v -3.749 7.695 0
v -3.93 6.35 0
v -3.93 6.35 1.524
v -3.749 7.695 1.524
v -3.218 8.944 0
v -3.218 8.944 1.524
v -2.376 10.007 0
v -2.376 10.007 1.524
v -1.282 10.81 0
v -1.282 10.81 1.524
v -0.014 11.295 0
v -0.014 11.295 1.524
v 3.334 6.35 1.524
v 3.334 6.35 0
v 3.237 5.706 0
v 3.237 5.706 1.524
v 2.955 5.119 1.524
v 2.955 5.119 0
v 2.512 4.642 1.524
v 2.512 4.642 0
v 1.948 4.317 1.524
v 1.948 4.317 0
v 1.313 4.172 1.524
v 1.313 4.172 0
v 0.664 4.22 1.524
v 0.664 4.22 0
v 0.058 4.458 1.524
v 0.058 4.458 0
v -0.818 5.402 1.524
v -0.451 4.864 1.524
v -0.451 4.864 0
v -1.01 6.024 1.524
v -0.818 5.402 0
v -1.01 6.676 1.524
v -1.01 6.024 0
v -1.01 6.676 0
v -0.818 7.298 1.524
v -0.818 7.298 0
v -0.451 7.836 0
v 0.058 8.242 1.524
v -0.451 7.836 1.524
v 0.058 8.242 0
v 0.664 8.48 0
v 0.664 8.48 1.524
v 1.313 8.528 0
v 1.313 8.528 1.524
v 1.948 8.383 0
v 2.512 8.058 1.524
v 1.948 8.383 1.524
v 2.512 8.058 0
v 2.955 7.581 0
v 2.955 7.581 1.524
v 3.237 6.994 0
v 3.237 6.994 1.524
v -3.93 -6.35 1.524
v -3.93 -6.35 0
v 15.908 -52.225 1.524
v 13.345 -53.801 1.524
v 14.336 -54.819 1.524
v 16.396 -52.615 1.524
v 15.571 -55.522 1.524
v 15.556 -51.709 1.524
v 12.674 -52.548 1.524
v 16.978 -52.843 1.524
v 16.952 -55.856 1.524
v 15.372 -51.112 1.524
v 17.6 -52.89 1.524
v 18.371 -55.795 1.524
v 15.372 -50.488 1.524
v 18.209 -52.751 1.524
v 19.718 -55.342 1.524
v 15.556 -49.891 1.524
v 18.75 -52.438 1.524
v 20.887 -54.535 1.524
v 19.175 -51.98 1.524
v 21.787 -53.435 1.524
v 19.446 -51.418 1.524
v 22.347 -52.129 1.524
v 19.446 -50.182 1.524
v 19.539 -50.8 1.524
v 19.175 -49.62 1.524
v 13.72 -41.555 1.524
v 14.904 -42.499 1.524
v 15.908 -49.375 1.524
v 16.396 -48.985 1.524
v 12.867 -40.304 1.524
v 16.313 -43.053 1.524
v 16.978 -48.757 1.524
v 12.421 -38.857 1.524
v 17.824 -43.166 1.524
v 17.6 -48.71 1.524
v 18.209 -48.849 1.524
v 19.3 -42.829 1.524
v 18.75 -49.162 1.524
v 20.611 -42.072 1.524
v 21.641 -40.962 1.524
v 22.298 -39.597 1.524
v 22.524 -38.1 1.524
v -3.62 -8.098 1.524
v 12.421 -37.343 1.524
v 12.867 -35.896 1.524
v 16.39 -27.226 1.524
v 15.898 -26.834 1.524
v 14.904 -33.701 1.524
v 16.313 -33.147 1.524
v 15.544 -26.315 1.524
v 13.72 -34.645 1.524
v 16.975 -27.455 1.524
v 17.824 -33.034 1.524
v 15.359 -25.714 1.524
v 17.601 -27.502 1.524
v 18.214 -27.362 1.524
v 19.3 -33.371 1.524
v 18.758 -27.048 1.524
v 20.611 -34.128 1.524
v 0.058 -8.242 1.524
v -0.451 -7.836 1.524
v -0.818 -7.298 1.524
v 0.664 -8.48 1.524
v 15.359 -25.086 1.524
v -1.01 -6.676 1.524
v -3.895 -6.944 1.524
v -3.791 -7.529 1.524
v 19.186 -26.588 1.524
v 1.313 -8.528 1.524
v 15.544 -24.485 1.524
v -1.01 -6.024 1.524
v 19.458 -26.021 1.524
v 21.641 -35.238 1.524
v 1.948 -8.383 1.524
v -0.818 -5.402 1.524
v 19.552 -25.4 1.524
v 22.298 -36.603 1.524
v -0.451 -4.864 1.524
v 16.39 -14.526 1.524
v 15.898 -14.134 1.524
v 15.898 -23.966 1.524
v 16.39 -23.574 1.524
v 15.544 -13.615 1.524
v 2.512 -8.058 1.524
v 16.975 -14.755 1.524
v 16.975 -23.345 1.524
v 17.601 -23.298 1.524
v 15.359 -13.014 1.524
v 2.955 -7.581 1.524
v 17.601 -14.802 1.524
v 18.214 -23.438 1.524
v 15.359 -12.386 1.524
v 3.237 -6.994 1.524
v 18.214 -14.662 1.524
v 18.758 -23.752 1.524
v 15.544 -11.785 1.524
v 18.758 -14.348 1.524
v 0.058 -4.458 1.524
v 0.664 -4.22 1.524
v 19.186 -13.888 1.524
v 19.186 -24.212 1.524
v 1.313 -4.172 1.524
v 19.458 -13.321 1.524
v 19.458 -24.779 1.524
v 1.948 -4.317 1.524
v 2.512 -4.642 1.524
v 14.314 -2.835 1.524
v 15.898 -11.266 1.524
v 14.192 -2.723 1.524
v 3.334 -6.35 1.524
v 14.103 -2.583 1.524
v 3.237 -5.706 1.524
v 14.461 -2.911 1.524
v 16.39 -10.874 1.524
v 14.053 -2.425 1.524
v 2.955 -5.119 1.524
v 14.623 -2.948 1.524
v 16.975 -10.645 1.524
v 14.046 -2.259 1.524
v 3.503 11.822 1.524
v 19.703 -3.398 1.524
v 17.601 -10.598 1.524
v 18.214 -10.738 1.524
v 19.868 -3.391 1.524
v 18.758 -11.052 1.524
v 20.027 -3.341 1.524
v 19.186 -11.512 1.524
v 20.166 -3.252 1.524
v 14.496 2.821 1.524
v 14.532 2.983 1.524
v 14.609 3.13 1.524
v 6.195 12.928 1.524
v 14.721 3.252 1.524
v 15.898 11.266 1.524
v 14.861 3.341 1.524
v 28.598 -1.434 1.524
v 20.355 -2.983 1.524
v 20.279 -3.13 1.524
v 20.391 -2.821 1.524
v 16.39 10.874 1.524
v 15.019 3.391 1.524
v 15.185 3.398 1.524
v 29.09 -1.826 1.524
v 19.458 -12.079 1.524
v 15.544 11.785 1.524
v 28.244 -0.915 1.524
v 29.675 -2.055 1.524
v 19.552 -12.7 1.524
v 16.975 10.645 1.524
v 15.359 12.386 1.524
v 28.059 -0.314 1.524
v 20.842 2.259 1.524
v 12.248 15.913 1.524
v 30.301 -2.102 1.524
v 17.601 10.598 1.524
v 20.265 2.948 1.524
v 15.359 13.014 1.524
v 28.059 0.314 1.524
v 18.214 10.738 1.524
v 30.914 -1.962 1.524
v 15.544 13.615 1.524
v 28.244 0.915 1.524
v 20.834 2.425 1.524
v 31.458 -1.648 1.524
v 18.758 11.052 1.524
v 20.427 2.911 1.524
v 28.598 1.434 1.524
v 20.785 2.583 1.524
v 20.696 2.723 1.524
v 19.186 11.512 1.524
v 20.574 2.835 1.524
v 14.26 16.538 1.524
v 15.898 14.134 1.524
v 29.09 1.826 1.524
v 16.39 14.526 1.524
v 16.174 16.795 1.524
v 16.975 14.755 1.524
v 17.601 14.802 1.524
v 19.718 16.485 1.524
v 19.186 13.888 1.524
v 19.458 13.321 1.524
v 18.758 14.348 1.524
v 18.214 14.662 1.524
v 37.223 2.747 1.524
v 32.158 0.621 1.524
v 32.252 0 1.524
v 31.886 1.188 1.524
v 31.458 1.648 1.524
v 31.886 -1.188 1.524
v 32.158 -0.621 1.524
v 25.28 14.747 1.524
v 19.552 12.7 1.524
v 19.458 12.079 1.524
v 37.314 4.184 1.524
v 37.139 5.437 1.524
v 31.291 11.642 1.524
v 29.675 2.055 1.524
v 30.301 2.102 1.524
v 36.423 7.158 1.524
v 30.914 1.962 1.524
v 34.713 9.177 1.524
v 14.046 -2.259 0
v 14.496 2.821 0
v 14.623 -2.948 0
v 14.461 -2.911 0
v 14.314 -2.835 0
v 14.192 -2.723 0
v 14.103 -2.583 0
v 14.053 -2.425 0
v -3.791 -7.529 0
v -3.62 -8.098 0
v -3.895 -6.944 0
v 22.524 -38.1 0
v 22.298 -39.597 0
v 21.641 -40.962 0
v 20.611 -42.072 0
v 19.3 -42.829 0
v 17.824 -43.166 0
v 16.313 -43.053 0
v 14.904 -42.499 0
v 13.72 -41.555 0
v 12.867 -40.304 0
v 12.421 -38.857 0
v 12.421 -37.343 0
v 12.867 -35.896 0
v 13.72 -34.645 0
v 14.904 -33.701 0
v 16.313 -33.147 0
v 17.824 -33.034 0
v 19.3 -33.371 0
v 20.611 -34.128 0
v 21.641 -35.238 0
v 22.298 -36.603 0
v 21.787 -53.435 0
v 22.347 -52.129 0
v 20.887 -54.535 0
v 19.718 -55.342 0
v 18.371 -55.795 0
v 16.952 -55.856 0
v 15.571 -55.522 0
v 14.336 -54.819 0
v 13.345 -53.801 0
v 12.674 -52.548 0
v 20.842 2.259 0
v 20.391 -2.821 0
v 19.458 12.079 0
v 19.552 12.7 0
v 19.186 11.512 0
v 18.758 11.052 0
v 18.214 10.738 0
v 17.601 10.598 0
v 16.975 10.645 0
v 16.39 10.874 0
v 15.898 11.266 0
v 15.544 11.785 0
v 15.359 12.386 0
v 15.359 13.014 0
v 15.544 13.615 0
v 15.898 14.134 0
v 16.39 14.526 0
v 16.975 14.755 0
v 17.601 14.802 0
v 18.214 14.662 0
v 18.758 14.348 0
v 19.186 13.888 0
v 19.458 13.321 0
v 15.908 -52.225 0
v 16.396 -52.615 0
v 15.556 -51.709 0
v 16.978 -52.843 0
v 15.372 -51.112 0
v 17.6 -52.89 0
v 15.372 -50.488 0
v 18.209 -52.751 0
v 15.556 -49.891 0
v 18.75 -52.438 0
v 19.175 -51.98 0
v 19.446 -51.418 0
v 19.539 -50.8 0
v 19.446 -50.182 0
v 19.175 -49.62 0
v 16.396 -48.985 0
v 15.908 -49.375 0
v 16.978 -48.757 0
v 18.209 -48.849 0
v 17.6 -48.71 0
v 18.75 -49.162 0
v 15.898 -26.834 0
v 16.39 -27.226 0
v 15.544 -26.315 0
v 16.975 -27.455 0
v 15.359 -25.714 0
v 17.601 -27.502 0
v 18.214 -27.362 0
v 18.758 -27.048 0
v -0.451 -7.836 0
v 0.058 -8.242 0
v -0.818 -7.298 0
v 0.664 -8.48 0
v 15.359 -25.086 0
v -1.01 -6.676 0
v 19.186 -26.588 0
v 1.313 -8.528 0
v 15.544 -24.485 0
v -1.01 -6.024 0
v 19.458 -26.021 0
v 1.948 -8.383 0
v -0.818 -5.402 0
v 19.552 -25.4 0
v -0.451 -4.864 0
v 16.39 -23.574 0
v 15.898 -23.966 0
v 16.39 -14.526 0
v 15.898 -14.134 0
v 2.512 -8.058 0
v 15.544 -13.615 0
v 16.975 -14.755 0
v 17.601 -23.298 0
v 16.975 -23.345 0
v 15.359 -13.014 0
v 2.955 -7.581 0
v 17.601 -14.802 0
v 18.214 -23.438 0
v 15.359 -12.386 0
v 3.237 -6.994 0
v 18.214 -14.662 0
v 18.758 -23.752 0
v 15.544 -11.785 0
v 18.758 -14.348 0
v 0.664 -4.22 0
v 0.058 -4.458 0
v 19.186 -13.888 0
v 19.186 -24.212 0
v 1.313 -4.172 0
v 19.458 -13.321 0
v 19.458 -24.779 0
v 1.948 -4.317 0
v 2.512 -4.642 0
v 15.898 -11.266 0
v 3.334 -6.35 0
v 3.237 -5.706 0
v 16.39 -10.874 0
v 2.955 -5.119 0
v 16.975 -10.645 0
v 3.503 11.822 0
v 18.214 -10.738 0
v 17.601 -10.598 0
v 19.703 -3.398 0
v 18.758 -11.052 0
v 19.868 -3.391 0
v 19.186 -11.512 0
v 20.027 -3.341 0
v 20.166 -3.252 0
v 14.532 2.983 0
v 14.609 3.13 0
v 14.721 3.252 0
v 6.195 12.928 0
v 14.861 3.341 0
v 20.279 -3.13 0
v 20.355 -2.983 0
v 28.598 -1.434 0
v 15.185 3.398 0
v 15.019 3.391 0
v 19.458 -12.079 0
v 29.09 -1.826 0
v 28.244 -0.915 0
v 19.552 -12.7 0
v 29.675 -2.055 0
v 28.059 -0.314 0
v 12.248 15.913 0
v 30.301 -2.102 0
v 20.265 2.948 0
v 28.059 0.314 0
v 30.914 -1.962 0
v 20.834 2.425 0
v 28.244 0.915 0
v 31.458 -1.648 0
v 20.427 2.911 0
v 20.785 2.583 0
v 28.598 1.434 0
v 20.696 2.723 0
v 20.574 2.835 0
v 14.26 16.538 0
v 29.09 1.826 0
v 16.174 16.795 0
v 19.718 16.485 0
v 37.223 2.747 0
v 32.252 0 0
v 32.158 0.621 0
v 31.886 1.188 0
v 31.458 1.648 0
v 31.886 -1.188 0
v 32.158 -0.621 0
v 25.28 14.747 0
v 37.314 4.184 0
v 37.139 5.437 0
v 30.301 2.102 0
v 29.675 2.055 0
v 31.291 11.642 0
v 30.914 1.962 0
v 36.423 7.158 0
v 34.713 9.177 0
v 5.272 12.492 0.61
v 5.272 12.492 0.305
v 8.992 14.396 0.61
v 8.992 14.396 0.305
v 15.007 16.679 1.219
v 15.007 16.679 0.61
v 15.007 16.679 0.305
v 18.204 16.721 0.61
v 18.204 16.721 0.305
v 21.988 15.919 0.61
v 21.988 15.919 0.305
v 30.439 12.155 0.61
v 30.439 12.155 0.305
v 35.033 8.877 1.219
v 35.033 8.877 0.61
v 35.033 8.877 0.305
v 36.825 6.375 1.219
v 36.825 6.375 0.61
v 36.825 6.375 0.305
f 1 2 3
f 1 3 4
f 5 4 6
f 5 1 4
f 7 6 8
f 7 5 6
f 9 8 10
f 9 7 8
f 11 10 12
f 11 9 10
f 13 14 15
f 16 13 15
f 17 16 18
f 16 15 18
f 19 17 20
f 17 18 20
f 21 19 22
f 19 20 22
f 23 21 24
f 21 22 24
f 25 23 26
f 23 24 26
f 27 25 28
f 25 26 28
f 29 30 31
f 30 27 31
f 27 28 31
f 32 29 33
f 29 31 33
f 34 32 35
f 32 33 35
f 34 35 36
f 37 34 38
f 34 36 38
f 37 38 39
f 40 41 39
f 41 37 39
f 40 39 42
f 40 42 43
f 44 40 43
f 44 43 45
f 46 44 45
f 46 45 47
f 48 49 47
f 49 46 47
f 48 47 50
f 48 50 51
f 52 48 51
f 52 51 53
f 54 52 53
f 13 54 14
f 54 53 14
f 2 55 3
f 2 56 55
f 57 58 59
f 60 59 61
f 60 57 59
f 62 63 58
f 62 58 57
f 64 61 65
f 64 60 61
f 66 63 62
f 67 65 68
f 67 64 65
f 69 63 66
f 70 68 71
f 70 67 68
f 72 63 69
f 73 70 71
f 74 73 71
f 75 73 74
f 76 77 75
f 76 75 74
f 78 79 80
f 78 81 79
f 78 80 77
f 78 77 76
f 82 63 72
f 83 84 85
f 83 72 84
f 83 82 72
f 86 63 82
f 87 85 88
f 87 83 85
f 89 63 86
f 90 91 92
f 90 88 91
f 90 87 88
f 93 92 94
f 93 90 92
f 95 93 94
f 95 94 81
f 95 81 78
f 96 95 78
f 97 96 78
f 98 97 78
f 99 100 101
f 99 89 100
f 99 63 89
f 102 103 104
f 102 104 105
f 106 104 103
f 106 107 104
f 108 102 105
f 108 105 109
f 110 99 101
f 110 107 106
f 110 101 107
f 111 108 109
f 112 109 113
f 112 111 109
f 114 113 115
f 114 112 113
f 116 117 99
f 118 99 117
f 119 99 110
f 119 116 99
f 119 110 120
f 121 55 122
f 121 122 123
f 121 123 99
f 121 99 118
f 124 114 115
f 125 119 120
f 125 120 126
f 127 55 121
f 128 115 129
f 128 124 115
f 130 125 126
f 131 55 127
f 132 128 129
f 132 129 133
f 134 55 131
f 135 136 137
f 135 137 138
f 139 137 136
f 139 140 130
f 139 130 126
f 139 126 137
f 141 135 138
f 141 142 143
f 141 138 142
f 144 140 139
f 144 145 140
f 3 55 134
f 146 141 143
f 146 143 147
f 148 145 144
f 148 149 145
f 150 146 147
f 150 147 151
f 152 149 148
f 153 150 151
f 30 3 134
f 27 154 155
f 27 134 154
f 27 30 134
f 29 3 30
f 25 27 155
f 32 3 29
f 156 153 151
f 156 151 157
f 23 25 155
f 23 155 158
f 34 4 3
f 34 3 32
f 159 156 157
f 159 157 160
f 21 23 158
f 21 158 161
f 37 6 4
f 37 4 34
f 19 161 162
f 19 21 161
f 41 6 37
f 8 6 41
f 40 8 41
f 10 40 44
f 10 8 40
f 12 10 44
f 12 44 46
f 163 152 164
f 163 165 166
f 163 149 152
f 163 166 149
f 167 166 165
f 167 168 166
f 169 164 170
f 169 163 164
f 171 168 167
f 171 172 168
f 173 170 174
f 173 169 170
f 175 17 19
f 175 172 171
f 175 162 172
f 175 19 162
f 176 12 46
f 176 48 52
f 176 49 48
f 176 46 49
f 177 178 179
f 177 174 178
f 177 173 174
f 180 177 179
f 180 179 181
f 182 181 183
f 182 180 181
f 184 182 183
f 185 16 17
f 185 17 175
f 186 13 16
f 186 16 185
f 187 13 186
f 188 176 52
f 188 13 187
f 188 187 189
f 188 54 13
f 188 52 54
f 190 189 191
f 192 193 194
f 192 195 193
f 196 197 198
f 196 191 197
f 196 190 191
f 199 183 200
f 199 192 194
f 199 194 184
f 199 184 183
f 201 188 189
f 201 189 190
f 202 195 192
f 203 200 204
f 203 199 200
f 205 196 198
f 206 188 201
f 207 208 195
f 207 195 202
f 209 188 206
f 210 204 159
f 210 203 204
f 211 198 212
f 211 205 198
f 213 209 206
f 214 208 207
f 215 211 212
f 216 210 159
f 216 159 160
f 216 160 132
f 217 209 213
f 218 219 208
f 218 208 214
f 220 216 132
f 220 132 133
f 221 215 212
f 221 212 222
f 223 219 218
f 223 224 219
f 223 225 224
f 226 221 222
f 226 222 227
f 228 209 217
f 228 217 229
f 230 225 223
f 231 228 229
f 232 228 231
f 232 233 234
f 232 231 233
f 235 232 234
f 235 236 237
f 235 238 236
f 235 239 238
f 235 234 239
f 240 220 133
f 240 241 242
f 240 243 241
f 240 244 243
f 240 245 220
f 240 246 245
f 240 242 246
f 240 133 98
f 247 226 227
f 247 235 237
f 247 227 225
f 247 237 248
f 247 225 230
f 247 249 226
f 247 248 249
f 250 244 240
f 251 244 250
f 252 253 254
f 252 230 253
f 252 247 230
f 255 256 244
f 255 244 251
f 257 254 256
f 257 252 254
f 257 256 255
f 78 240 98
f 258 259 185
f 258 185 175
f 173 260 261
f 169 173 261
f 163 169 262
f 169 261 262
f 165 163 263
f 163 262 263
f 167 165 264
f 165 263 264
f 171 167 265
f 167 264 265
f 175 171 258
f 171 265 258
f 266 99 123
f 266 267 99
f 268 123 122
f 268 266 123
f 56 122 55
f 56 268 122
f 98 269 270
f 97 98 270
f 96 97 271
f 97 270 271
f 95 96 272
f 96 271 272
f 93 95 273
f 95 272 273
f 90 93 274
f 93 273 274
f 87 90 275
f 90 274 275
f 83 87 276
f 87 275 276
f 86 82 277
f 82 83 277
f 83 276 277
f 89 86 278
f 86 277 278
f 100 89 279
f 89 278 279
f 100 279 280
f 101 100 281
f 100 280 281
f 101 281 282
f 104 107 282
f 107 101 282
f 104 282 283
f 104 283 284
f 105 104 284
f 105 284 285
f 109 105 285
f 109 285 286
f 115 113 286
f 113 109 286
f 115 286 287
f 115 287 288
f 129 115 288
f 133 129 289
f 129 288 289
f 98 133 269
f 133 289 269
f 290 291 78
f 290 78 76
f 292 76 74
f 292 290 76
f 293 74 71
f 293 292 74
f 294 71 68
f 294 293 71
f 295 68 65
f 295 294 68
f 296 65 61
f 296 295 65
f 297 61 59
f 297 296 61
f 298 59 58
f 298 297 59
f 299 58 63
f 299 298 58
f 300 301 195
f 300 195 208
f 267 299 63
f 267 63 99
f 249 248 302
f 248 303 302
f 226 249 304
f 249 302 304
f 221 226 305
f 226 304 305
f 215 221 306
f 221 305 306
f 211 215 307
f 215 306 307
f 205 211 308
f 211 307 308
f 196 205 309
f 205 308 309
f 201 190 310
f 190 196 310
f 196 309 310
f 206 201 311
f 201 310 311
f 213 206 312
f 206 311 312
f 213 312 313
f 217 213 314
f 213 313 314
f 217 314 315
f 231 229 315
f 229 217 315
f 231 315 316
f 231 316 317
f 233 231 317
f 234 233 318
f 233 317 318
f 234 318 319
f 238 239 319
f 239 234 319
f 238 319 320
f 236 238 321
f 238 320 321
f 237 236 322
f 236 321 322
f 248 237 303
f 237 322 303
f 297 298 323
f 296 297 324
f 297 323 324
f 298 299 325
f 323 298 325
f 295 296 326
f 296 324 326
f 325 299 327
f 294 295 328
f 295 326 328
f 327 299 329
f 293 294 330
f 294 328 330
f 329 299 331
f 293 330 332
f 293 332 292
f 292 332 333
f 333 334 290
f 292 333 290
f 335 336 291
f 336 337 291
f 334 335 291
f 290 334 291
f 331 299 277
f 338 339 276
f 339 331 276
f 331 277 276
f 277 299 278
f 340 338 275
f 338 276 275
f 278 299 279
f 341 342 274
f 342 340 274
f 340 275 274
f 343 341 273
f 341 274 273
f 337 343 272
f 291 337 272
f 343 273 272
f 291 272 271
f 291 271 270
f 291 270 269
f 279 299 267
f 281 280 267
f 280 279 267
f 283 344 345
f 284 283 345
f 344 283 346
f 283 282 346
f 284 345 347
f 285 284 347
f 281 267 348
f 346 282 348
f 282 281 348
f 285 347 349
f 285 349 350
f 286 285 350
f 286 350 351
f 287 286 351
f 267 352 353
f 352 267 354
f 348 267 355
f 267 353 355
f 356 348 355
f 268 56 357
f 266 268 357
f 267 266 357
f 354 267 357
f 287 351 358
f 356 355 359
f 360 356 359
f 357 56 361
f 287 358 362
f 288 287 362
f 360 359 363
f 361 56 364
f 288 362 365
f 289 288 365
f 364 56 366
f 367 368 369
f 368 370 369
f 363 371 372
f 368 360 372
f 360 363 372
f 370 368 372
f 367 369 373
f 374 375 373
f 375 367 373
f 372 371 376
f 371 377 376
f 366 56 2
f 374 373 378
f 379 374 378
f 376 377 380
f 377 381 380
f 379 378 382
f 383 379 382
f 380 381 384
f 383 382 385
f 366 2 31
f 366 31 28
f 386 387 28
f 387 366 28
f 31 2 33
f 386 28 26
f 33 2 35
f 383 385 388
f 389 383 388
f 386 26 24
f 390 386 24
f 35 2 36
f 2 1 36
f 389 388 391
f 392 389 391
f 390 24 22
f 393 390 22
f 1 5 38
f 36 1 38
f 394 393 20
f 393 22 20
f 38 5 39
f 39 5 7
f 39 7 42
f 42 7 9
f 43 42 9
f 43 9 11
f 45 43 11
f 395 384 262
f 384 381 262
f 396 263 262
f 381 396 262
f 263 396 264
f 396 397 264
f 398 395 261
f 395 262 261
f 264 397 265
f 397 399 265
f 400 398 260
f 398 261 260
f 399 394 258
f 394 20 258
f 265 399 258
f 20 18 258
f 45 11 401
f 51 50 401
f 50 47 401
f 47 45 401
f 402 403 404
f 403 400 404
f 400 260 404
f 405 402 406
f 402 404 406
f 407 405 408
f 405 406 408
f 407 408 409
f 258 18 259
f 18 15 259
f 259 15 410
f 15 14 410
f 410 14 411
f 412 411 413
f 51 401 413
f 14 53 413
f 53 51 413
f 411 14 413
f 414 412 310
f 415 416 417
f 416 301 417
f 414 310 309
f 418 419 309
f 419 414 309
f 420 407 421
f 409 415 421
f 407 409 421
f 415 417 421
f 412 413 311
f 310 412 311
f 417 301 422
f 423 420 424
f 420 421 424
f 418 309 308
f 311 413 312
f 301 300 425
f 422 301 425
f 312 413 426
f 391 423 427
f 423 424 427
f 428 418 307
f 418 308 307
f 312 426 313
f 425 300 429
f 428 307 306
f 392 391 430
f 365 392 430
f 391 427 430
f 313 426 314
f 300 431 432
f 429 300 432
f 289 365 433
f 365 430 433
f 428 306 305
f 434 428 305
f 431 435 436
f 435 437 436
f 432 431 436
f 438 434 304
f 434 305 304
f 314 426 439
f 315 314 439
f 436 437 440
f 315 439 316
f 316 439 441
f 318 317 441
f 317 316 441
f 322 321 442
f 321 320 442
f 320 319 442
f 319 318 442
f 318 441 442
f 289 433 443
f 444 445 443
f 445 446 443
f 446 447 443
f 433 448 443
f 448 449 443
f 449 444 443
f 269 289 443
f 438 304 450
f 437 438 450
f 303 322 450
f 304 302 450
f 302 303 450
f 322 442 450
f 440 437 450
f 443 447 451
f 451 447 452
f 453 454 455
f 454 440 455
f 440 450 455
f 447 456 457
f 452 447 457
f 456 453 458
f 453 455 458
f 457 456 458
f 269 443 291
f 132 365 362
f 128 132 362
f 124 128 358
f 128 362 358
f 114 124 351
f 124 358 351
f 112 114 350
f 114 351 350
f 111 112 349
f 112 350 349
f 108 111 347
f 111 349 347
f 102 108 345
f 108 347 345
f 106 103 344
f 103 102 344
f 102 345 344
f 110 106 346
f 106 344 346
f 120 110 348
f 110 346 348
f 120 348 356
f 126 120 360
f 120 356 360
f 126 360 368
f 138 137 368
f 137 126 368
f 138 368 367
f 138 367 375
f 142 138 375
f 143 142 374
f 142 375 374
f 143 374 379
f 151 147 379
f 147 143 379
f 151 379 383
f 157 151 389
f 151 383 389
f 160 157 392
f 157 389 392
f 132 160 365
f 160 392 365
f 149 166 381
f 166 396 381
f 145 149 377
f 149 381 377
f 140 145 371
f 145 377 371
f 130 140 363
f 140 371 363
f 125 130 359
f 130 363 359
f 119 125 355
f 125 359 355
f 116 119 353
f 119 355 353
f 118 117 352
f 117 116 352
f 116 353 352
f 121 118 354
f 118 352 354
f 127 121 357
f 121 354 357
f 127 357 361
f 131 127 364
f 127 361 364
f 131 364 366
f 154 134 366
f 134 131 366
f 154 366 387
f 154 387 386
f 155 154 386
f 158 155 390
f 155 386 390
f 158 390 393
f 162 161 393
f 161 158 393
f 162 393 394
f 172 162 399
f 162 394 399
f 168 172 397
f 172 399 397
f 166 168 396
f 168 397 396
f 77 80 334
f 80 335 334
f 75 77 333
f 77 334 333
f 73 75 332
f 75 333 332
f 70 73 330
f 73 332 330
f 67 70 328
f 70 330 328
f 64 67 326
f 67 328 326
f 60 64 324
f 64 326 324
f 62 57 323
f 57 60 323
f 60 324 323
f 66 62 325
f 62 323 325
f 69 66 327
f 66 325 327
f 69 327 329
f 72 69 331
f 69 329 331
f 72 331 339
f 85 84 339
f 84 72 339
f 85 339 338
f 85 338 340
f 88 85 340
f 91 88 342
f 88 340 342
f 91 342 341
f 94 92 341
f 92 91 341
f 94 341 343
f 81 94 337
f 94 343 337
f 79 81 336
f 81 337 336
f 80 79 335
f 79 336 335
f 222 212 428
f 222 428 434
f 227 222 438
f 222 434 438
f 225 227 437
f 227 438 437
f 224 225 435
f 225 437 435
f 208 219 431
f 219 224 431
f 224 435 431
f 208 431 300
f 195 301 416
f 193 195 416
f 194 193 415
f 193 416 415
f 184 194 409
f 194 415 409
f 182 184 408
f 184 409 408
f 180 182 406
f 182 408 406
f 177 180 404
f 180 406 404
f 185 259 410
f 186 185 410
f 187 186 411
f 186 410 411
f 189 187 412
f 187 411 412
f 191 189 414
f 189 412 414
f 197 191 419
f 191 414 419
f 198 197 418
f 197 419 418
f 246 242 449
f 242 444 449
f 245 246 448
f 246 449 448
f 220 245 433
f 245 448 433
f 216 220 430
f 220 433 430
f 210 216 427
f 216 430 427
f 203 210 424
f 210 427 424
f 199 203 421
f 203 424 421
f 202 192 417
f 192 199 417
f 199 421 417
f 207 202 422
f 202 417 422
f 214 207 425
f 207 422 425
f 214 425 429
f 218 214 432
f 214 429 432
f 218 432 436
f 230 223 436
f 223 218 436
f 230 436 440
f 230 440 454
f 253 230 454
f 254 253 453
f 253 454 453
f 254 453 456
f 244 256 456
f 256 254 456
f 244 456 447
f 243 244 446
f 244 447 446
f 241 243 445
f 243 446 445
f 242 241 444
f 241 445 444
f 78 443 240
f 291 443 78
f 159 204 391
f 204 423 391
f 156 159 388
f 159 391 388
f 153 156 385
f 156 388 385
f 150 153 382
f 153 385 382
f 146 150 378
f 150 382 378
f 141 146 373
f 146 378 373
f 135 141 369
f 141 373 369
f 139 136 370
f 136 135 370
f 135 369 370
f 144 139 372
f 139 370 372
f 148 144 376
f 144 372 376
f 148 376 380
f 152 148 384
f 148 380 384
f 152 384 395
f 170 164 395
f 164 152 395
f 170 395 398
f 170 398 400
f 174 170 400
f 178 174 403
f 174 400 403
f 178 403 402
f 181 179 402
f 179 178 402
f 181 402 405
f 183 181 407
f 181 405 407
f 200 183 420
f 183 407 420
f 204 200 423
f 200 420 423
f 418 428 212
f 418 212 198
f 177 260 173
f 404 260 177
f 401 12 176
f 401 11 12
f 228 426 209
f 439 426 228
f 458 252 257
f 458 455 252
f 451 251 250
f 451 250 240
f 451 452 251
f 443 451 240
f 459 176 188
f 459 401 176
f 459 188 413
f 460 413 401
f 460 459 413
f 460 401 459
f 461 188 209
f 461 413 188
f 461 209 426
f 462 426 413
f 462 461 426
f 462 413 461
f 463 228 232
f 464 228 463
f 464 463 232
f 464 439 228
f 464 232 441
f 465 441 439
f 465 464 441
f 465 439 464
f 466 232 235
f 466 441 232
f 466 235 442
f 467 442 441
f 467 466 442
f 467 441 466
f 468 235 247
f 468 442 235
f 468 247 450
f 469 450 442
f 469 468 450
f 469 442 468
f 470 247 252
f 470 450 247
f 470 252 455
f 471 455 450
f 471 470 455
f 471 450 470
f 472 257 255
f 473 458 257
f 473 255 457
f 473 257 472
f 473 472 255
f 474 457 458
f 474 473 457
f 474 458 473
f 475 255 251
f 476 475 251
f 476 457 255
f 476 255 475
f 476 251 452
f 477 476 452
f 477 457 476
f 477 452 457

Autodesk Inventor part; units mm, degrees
ref_plane "YZ Plane" through (0, 0, 0) normal (1, 0, 0) x (0, 1, 0)
ref_plane "XZ Plane" through (0, 0, 0) normal (0, 1, 0) x (-1, 0, 0)
ref_plane "XY Plane" through (0, 0, 0) normal (0, 0, 1) x (1, 0, 0)
sketch "Sketch1" plane through (0, 0, 0) normal (0, 0, 1) x (1, 0, 0)
  line L0 (37.223, 2.7469) -> (22.3469, -52.1291)
  arc A0 (12.6742, -52.5484) -> (22.3469, -52.1291) centre (17.4439, -50.8) ccw
  line L1 (12.6742, -52.5484) -> (-3.6199, -8.0984)
  arc A1 (-3.9302, -6.35) -> (-3.6199, -8.0984) centre (1.1498, -6.35) ccw
  line L2 (-3.9302, -6.35) -> (-3.9302, 6.35)
  arc A2 (-0.0144, 11.2948) -> (-3.9302, 6.35) centre (1.1498, 6.35) ccw
  arc A3 (20.8415, 2.2589) -> (20.2651, 2.9475) centre (20.209, 2.315) ccw
  line L3 (20.2651, 2.9475) -> (15.185, 3.3976)
  arc A4 (15.185, 3.3976) -> (14.4964, 2.8212) centre (15.1289, 2.7651) ccw
  line L4 (14.4964, 2.8212) -> (14.0462, -2.2589)
  arc A5 (14.0462, -2.2589) -> (14.6227, -2.9475) centre (14.6788, -2.315) ccw
  line L5 (14.6227, -2.9475) -> (19.7028, -3.3976)
  arc A6 (19.7028, -3.3976) -> (20.3914, -2.8212) centre (19.7589, -2.7651) ccw
  line L6 (20.3914, -2.8212) -> (20.8415, 2.2589)
  circle A7 centre (17.4439, -38.1) radius 5.08
  circle A8 centre (17.4439, -25.4) radius 2.1082
  circle A9 centre (17.4439, -12.7) radius 2.1082
  circle A10 centre (30.1439, 0) radius 2.1082
  circle A11 centre (17.4439, 12.7) radius 2.1082
  circle A12 centre (1.1498, 6.35) radius 2.1844
  circle A13 centre (1.1498, -6.35) radius 2.1844
  circle A14 centre (17.4439, -50.8) radius 2.0955
  line L7 (-0.0144, 11.2948) -> (3.3342, 11.2948) construction
  line L8 (3.3342, 11.2948) -> (7.5872, 13.6698) construction
  line L9 (7.5872, 13.6698) -> (12.3639, 16.3695) construction
  line L10 (12.3639, 16.3695) -> (17.4439, 17.5149) construction
  line L11 (17.4439, 17.5149) -> (26.2926, 14.8082) construction
  line L12 (26.2926, 14.8082) -> (32.2521, 11.2948) construction
  line L13 (32.2521, 11.2948) -> (37.9163, 7.1275) construction
  line L14 (37.9163, 7.1275) -> (37.223, 2.7469) construction
  spline S0 degree 4 poles (-0.0144, 11.2948) (3.3342, 11.2948) (7.5872, 13.6698) (12.3639, 16.3695) (17.4439, 17.5149) (26.2926, 14.8082) (32.2521, 11.2948) (37.9163, 7.1275) (37.223, 2.7469) knots 1 1 1 1 1 2 3 4 5 6 6 6 6 6
  point P0 (-3.9302, 6.35)
  point P1 (-3.9302, -6.35)
  point P2 (-3.6199, -8.0984)
  point P3 (12.6742, -52.5484)
  point P4 (21.7462, -53.5011)
  point P5 (20.8415, 2.2589)
  point P6 (20.3914, -2.8212)
  point P7 (14.6227, -2.9475)
  point P8 (14.4964, 2.8212)
  point P9 (20.2651, 2.9475)
  dimension "d0" = 4.3688
  dimension "d1" = 4.3688
  dimension "d2" = 4.2164
  dimension "d3" = 4.2164
  dimension "d5" = 4.2164
  dimension "d6" = 4.2164
  dimension "d7" = 10.16
  dimension "d8" = 4.191
extrude "Extrusion1" add sketch "Sketch1" along normal blind 1.524
properties part number "coffin-v2"
